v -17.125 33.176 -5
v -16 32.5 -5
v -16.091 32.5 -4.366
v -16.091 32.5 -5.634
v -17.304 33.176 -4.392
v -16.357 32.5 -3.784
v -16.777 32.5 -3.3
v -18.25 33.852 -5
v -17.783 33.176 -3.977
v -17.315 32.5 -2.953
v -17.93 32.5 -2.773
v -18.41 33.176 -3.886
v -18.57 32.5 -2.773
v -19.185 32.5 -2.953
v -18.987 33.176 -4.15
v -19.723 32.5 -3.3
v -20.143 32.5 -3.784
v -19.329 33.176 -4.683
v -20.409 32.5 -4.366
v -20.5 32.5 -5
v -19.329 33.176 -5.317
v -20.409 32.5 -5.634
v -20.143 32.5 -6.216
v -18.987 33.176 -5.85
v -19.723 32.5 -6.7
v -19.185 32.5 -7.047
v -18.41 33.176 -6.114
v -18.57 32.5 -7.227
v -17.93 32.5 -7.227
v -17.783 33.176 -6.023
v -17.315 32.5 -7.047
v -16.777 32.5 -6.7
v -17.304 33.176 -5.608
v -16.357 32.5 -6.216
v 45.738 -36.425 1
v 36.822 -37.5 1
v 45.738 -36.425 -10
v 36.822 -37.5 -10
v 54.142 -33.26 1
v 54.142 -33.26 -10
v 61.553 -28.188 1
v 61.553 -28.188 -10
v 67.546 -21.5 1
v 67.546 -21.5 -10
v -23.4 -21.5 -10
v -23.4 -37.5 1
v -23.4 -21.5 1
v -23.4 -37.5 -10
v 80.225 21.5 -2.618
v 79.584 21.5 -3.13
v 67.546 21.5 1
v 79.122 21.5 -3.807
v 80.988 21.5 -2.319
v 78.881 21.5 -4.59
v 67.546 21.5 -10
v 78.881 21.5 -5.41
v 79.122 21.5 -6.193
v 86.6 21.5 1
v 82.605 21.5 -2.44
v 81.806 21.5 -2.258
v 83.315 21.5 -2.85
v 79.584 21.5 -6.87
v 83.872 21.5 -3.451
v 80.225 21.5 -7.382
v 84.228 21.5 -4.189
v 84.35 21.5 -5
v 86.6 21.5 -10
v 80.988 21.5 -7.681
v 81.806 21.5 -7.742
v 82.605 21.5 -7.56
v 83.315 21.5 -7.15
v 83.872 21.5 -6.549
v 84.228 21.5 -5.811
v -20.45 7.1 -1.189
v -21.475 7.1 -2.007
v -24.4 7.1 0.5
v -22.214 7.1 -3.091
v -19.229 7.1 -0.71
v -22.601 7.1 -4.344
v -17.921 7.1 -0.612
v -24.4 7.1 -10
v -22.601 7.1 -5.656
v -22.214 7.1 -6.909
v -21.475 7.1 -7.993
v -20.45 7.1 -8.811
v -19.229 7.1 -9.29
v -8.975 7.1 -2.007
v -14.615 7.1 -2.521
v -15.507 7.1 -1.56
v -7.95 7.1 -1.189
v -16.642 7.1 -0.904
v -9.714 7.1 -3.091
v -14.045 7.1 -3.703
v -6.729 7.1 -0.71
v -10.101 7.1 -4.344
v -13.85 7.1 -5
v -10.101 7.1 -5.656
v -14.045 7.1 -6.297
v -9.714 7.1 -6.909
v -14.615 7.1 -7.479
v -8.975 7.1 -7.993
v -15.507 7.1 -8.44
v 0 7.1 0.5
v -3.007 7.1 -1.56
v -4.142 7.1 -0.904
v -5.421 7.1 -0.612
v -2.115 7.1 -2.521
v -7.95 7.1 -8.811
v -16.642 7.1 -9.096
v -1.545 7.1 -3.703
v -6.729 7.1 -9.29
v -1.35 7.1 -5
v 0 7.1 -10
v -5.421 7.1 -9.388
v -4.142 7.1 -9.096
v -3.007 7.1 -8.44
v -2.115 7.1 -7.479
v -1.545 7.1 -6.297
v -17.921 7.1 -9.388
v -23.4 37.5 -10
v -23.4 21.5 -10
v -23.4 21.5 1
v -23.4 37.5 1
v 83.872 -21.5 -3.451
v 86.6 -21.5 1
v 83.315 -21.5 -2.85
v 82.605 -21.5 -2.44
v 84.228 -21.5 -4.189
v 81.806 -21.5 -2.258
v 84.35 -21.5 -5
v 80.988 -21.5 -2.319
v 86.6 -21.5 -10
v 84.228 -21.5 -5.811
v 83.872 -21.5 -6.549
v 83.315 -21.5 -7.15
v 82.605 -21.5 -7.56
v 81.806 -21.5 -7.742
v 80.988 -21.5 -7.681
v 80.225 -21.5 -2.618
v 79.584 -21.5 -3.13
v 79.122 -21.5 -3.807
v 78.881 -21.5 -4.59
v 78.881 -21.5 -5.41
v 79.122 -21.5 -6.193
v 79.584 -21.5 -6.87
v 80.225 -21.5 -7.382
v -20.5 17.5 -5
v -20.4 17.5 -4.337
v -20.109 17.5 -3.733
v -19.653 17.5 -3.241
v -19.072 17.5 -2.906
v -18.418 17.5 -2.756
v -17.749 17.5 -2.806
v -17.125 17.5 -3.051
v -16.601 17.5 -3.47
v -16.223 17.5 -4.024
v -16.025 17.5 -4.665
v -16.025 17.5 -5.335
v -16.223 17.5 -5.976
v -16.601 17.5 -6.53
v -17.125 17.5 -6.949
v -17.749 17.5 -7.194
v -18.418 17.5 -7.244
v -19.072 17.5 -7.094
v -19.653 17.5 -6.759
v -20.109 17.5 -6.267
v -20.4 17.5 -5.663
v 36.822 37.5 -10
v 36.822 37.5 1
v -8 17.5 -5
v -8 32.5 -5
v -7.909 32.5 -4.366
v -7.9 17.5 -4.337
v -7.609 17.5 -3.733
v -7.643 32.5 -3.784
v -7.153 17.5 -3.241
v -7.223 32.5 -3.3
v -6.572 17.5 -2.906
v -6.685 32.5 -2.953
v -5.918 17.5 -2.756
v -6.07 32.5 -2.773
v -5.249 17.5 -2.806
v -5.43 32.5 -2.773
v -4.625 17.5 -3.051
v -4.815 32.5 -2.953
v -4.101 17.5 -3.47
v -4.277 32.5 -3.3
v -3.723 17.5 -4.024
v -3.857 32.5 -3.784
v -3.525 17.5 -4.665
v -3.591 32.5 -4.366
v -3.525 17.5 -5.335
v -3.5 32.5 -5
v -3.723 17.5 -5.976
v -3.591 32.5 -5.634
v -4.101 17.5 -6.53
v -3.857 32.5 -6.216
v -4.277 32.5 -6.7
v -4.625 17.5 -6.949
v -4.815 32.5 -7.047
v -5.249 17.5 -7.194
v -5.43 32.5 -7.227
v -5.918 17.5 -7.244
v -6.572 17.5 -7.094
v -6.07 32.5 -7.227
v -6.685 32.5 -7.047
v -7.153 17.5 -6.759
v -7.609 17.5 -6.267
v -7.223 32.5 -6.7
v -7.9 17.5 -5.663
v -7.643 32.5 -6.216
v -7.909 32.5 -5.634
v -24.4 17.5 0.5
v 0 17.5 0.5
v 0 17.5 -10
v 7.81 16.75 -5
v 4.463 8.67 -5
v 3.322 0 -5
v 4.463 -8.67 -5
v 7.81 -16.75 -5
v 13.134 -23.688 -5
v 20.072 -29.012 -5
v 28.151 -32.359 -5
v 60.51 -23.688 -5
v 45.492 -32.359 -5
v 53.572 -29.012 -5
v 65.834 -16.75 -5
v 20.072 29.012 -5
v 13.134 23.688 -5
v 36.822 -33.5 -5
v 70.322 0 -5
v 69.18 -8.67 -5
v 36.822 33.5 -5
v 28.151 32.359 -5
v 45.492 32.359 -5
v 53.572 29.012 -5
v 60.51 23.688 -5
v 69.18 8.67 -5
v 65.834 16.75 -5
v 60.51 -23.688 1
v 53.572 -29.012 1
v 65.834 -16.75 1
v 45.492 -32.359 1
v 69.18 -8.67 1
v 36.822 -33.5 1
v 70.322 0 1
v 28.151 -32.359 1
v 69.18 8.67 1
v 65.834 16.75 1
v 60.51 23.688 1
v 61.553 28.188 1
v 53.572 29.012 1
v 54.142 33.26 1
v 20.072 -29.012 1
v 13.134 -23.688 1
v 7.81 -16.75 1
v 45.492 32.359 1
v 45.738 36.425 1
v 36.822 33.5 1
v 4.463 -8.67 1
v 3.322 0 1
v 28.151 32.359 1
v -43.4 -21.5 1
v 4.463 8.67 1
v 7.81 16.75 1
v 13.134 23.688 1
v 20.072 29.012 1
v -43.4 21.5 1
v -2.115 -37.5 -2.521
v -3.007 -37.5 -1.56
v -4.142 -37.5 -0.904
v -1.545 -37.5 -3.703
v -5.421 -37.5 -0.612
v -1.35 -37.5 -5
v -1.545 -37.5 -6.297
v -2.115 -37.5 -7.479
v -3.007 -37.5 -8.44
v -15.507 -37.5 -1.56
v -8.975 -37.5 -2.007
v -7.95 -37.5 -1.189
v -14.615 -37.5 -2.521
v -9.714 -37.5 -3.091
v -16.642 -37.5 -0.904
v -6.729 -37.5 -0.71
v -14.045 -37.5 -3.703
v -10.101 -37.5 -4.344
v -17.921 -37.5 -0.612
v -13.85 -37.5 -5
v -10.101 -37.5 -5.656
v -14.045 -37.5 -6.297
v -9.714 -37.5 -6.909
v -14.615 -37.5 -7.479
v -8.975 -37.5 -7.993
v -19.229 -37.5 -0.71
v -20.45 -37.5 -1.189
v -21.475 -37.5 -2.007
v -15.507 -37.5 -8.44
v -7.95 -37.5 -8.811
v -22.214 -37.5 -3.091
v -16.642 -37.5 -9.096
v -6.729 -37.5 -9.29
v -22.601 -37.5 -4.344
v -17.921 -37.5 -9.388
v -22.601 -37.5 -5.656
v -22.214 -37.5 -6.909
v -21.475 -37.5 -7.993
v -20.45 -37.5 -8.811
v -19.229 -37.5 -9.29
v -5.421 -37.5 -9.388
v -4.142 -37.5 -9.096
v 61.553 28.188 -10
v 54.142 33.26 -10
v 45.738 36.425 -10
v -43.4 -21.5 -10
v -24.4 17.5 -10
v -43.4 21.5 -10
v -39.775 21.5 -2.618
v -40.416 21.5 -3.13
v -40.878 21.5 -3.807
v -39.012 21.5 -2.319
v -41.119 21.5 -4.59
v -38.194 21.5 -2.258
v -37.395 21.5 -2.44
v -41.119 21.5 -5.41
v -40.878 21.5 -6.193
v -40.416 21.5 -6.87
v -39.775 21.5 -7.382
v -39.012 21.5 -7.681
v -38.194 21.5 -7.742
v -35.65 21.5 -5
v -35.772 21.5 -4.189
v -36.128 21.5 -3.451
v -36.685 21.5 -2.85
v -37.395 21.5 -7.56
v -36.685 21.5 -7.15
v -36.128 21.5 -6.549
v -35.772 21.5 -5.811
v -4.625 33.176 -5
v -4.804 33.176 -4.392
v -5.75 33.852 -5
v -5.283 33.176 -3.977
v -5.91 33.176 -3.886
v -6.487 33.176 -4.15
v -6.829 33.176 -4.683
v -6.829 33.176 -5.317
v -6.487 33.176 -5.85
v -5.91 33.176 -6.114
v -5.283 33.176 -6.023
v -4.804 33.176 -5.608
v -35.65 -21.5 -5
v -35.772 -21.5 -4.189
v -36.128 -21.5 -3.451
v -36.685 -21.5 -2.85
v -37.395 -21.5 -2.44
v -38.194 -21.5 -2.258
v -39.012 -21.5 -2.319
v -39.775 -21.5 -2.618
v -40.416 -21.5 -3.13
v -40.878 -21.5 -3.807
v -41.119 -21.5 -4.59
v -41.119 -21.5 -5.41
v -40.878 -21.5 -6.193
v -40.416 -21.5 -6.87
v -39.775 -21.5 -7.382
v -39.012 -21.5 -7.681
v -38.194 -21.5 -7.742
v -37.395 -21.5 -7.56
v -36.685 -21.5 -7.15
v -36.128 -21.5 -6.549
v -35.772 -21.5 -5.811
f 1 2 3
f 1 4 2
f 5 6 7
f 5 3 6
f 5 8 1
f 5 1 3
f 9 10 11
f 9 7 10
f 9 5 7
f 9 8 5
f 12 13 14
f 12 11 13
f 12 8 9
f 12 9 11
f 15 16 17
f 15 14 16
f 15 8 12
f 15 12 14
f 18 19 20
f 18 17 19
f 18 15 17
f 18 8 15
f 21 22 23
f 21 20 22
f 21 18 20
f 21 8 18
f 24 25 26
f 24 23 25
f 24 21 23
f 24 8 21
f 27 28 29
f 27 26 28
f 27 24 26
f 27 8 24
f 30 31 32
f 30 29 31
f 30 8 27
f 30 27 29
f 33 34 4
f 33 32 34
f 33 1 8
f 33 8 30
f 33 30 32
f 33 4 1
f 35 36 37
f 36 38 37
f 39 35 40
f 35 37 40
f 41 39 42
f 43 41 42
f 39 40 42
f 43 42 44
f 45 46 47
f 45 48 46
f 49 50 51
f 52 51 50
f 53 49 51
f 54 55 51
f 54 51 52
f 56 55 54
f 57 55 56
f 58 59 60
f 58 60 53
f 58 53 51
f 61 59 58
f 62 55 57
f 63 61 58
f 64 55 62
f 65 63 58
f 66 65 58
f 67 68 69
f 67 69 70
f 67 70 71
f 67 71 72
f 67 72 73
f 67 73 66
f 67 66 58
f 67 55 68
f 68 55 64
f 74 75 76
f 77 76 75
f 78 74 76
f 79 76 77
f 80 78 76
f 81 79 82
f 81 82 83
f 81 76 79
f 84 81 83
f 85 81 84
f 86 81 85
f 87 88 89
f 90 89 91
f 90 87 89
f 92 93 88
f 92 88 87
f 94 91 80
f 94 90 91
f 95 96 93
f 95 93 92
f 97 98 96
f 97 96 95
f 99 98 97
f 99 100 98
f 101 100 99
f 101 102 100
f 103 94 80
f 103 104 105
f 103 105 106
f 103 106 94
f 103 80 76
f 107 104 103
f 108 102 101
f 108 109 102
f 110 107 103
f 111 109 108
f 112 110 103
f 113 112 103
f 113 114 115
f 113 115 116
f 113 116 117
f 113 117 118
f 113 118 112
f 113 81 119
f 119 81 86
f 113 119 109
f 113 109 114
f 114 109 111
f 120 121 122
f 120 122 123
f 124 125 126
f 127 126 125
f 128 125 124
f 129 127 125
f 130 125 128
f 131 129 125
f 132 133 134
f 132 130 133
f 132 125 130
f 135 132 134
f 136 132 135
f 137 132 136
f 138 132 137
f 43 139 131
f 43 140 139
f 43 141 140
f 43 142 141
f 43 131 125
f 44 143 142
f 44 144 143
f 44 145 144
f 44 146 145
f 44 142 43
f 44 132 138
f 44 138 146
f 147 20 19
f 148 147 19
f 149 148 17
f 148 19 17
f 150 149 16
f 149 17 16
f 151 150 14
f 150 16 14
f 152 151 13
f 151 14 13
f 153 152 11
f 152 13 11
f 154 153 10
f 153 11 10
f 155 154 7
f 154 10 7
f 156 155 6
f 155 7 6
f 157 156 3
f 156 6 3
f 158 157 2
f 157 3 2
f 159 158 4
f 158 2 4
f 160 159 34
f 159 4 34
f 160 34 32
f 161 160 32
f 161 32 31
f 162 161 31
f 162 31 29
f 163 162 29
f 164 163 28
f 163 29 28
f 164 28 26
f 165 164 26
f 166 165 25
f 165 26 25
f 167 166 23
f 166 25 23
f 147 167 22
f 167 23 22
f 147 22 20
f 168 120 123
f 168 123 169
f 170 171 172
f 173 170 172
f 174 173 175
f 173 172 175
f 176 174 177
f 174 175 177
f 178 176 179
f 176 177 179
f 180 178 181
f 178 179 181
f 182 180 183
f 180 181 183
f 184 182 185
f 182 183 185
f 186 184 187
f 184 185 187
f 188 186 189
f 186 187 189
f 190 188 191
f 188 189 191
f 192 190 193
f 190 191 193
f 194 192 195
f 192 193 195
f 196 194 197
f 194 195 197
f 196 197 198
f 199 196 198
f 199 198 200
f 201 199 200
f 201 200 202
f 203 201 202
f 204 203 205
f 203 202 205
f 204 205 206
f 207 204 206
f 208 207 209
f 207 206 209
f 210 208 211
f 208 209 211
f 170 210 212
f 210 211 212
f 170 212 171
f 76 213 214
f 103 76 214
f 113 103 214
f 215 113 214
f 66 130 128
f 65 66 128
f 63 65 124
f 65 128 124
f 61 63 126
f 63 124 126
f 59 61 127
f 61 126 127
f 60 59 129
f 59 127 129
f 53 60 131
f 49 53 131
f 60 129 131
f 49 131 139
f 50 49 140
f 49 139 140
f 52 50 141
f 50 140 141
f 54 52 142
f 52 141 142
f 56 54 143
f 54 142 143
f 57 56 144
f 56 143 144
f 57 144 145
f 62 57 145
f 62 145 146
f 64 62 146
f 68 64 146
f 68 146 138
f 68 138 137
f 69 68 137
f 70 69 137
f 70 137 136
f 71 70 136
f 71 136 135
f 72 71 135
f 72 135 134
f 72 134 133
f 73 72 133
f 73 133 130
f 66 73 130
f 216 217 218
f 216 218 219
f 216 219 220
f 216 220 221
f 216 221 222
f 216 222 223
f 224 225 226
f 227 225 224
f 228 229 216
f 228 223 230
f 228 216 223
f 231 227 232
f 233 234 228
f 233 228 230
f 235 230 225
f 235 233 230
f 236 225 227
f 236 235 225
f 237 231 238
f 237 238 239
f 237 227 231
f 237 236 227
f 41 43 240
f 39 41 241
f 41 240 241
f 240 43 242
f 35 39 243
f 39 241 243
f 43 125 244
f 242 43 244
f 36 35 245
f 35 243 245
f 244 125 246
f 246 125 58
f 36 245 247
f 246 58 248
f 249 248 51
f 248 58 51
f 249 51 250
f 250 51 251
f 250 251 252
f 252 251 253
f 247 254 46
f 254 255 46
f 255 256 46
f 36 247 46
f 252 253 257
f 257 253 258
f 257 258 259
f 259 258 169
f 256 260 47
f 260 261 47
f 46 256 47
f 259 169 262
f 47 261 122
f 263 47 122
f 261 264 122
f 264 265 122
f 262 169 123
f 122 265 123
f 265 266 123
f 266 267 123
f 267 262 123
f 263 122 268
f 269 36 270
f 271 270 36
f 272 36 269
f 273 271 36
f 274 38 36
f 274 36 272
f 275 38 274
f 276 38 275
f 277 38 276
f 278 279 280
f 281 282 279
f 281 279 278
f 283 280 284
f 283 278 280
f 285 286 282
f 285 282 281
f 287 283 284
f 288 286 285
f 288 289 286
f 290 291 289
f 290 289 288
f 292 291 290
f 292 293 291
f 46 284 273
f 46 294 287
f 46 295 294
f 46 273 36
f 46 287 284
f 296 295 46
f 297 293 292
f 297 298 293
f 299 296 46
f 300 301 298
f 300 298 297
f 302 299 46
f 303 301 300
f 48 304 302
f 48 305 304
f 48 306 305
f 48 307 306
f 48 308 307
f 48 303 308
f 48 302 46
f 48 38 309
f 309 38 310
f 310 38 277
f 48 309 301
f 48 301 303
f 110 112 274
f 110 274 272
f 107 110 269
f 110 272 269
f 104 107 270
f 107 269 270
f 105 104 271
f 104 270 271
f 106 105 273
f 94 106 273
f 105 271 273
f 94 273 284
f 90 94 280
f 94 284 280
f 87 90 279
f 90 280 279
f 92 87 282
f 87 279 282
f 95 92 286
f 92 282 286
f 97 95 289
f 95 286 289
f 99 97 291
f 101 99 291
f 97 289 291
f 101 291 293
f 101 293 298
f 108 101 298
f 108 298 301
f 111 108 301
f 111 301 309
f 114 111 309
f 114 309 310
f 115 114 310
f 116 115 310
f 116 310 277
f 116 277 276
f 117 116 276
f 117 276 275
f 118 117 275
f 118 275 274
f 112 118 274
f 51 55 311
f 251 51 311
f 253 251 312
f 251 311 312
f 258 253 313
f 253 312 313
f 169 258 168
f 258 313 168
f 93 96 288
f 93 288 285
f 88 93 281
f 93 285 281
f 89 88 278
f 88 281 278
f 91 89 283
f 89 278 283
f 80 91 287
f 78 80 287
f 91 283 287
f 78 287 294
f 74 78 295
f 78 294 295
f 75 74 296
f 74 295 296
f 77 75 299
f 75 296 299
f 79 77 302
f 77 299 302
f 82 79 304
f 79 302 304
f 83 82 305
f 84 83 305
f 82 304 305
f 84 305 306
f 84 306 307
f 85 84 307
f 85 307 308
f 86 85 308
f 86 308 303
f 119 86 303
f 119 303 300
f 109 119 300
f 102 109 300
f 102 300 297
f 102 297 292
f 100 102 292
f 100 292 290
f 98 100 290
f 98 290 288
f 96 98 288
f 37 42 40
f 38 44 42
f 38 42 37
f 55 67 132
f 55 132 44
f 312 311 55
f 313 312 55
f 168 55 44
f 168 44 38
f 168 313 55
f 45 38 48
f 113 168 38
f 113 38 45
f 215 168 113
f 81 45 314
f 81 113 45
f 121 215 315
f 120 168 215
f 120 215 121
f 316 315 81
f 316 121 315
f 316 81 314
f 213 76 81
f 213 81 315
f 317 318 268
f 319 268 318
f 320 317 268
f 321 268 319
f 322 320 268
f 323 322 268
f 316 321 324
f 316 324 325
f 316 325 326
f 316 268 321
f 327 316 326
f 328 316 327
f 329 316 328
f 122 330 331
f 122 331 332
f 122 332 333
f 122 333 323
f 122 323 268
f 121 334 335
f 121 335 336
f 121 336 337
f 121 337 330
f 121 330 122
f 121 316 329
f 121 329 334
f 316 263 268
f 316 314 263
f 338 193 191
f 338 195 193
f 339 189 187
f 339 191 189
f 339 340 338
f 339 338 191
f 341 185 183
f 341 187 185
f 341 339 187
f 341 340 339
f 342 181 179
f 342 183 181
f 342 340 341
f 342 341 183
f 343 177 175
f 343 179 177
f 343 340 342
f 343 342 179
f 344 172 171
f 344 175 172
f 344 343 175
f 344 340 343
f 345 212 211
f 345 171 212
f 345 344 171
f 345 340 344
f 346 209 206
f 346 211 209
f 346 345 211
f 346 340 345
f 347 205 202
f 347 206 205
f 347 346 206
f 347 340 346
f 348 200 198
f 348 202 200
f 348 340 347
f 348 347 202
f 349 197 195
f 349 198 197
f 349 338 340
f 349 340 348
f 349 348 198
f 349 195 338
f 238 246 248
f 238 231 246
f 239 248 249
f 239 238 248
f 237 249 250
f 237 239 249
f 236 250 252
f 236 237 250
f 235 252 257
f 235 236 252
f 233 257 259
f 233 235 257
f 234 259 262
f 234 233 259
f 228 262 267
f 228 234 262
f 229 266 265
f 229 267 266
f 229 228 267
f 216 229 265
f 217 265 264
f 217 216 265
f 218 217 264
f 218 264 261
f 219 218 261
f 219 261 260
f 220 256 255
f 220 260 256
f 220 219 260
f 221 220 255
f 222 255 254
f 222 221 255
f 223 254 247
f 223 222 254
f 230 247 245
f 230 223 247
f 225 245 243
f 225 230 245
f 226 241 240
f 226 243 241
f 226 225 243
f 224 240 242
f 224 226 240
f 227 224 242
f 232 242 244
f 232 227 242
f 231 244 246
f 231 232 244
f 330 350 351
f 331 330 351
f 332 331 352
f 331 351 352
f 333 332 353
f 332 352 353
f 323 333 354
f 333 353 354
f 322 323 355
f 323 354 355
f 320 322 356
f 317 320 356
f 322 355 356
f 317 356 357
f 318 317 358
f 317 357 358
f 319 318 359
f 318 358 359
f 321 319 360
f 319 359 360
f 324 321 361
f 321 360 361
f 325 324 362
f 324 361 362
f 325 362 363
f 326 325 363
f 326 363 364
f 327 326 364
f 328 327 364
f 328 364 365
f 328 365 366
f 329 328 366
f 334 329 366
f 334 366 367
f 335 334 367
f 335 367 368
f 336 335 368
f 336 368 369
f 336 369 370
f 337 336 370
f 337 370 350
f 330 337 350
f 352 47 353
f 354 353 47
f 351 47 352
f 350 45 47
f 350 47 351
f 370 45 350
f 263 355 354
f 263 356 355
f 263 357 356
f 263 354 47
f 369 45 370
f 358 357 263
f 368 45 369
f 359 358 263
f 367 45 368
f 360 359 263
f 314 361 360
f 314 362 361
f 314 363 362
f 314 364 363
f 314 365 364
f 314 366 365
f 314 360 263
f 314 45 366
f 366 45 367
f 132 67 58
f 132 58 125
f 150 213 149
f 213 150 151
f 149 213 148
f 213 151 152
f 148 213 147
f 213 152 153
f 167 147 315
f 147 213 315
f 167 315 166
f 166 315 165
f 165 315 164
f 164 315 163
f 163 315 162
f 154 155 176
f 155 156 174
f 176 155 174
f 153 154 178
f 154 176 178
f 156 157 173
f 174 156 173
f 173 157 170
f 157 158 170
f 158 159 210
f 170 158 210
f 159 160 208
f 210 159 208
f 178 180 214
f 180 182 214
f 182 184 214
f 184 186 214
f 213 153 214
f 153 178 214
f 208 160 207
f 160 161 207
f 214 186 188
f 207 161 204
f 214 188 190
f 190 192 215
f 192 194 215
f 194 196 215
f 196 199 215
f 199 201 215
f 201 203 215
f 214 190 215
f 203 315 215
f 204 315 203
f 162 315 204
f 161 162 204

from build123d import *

# Parameters (mm, degrees)
SKETCH_W            = 24.4
SKETCH_H            = 10.4
PAD_DEPTH           = 10
PAD_DEPTH_BACK      = 1
SKETCH001_R         = 33.5
POCKET_DEPTH        = 5
POCKET_DEPTH_BACK   = 100
SKETCH002_R         = 2.75
HOLE_DEPTH          = 72.501
HOLE001_D           = 4.5
HOLE001_DEPTH       = 70
HOLE001_CBORE_D     = 8.8
HOLE001_CBORE_DEPTH = 50
HOLE001_TIPS_R      = 2.25
SKETCH006_W         = 27.565709
SKETCH006_H         = 14.558517
PAD001_DEPTH        = 0.5


with BuildPart() as part:
    # Sketch → Pad (new body, two sides)
    with BuildSketch(Plane.XY) as pad_sk:
        with BuildLine():
            Line((-43.4, 21.5), (-23.4, 21.5))
            Line((-23.4, 21.5), (-23.4, 37.5))
            Line((-23.4, 37.5), (36.821733, 37.5))
            ThreePointArc((67.546316, 21.5), (54.142241, 33.260337), (36.821733, 37.5))
            Line((67.546316, 21.5), (86.6, 21.5))
            Line((86.6, 21.5), (86.6, -21.5))
            Line((86.6, -21.5), (67.546316, -21.5))
            ThreePointArc((36.821733, -37.5), (54.142241, -33.260337), (67.546316, -21.5))
            Line((36.821733, -37.5), (-23.4, -37.5))
            Line((-23.4, -37.5), (-23.4, -21.5))
            Line((-23.4, -21.5), (-43.4, -21.5))
            Line((-43.4, -21.5), (-43.4, 21.5))
        make_face()
        with Locations((-12.2, 12.3)):
            Rectangle(SKETCH_W, SKETCH_H, mode=Mode.SUBTRACT)
    extrude(amount=-PAD_DEPTH)
    extrude(pad_sk.sketch, amount=PAD_DEPTH_BACK)

    # Sketch001 → Pocket (cut, two sides)
    with BuildSketch(Plane.XY) as pocket_sk:
        with Locations((36.821733, 0)):
            Circle(SKETCH001_R)
    extrude(amount=-POCKET_DEPTH, mode=Mode.SUBTRACT)
    extrude(pocket_sk.sketch, amount=POCKET_DEPTH_BACK, mode=Mode.SUBTRACT)

    # Sketch002 → Hole (cut, through all)
    with BuildSketch(Plane.XZ.offset(35)):
        with Locations((-38.4, -5)):
            Circle(SKETCH002_R)
        with Locations((81.6, -5)):
            Circle(SKETCH002_R)
    extrude(amount=-HOLE_DEPTH, mode=Mode.SUBTRACT)

    # Hole001
    with Locations(Plane.XZ.offset(37.5)):
        with Locations((-18.25, -5), (-5.75, -5)):
            CounterBoreHole(HOLE001_D / 2, HOLE001_CBORE_D / 2, HOLE001_CBORE_DEPTH, depth=HOLE001_DEPTH)

    # Hole001 tips → Hole001 tip 1 section 0
    with BuildSketch(Plane.XZ.offset(-32.5), mode=Mode.PRIVATE) as hole001_tip_1_s0:
        with Locations((-18.25, -5)):
            Circle(HOLE001_TIPS_R)
    loft([hole001_tip_1_s0.sketch, Vertex(-18.25, 33.851936, -5)], mode=Mode.SUBTRACT)

    # Hole001 tips → Hole001 tip 2 section 0
    with BuildSketch(Plane.XZ.offset(-32.5), mode=Mode.PRIVATE) as hole001_tip_2_s0:
        with Locations((-5.75, -5)):
            Circle(HOLE001_TIPS_R)
    loft([hole001_tip_2_s0.sketch, Vertex(-5.75, 33.851936, -5)], mode=Mode.SUBTRACT)

    # Sketch006 → Pad001 (join)
    with BuildSketch(Plane.XY.offset(0.5)):
        with Locations((-12.99486, 11.748647)):
            Rectangle(SKETCH006_W, SKETCH006_H)
    extrude(amount=PAD001_DEPTH)


solid = part.part
